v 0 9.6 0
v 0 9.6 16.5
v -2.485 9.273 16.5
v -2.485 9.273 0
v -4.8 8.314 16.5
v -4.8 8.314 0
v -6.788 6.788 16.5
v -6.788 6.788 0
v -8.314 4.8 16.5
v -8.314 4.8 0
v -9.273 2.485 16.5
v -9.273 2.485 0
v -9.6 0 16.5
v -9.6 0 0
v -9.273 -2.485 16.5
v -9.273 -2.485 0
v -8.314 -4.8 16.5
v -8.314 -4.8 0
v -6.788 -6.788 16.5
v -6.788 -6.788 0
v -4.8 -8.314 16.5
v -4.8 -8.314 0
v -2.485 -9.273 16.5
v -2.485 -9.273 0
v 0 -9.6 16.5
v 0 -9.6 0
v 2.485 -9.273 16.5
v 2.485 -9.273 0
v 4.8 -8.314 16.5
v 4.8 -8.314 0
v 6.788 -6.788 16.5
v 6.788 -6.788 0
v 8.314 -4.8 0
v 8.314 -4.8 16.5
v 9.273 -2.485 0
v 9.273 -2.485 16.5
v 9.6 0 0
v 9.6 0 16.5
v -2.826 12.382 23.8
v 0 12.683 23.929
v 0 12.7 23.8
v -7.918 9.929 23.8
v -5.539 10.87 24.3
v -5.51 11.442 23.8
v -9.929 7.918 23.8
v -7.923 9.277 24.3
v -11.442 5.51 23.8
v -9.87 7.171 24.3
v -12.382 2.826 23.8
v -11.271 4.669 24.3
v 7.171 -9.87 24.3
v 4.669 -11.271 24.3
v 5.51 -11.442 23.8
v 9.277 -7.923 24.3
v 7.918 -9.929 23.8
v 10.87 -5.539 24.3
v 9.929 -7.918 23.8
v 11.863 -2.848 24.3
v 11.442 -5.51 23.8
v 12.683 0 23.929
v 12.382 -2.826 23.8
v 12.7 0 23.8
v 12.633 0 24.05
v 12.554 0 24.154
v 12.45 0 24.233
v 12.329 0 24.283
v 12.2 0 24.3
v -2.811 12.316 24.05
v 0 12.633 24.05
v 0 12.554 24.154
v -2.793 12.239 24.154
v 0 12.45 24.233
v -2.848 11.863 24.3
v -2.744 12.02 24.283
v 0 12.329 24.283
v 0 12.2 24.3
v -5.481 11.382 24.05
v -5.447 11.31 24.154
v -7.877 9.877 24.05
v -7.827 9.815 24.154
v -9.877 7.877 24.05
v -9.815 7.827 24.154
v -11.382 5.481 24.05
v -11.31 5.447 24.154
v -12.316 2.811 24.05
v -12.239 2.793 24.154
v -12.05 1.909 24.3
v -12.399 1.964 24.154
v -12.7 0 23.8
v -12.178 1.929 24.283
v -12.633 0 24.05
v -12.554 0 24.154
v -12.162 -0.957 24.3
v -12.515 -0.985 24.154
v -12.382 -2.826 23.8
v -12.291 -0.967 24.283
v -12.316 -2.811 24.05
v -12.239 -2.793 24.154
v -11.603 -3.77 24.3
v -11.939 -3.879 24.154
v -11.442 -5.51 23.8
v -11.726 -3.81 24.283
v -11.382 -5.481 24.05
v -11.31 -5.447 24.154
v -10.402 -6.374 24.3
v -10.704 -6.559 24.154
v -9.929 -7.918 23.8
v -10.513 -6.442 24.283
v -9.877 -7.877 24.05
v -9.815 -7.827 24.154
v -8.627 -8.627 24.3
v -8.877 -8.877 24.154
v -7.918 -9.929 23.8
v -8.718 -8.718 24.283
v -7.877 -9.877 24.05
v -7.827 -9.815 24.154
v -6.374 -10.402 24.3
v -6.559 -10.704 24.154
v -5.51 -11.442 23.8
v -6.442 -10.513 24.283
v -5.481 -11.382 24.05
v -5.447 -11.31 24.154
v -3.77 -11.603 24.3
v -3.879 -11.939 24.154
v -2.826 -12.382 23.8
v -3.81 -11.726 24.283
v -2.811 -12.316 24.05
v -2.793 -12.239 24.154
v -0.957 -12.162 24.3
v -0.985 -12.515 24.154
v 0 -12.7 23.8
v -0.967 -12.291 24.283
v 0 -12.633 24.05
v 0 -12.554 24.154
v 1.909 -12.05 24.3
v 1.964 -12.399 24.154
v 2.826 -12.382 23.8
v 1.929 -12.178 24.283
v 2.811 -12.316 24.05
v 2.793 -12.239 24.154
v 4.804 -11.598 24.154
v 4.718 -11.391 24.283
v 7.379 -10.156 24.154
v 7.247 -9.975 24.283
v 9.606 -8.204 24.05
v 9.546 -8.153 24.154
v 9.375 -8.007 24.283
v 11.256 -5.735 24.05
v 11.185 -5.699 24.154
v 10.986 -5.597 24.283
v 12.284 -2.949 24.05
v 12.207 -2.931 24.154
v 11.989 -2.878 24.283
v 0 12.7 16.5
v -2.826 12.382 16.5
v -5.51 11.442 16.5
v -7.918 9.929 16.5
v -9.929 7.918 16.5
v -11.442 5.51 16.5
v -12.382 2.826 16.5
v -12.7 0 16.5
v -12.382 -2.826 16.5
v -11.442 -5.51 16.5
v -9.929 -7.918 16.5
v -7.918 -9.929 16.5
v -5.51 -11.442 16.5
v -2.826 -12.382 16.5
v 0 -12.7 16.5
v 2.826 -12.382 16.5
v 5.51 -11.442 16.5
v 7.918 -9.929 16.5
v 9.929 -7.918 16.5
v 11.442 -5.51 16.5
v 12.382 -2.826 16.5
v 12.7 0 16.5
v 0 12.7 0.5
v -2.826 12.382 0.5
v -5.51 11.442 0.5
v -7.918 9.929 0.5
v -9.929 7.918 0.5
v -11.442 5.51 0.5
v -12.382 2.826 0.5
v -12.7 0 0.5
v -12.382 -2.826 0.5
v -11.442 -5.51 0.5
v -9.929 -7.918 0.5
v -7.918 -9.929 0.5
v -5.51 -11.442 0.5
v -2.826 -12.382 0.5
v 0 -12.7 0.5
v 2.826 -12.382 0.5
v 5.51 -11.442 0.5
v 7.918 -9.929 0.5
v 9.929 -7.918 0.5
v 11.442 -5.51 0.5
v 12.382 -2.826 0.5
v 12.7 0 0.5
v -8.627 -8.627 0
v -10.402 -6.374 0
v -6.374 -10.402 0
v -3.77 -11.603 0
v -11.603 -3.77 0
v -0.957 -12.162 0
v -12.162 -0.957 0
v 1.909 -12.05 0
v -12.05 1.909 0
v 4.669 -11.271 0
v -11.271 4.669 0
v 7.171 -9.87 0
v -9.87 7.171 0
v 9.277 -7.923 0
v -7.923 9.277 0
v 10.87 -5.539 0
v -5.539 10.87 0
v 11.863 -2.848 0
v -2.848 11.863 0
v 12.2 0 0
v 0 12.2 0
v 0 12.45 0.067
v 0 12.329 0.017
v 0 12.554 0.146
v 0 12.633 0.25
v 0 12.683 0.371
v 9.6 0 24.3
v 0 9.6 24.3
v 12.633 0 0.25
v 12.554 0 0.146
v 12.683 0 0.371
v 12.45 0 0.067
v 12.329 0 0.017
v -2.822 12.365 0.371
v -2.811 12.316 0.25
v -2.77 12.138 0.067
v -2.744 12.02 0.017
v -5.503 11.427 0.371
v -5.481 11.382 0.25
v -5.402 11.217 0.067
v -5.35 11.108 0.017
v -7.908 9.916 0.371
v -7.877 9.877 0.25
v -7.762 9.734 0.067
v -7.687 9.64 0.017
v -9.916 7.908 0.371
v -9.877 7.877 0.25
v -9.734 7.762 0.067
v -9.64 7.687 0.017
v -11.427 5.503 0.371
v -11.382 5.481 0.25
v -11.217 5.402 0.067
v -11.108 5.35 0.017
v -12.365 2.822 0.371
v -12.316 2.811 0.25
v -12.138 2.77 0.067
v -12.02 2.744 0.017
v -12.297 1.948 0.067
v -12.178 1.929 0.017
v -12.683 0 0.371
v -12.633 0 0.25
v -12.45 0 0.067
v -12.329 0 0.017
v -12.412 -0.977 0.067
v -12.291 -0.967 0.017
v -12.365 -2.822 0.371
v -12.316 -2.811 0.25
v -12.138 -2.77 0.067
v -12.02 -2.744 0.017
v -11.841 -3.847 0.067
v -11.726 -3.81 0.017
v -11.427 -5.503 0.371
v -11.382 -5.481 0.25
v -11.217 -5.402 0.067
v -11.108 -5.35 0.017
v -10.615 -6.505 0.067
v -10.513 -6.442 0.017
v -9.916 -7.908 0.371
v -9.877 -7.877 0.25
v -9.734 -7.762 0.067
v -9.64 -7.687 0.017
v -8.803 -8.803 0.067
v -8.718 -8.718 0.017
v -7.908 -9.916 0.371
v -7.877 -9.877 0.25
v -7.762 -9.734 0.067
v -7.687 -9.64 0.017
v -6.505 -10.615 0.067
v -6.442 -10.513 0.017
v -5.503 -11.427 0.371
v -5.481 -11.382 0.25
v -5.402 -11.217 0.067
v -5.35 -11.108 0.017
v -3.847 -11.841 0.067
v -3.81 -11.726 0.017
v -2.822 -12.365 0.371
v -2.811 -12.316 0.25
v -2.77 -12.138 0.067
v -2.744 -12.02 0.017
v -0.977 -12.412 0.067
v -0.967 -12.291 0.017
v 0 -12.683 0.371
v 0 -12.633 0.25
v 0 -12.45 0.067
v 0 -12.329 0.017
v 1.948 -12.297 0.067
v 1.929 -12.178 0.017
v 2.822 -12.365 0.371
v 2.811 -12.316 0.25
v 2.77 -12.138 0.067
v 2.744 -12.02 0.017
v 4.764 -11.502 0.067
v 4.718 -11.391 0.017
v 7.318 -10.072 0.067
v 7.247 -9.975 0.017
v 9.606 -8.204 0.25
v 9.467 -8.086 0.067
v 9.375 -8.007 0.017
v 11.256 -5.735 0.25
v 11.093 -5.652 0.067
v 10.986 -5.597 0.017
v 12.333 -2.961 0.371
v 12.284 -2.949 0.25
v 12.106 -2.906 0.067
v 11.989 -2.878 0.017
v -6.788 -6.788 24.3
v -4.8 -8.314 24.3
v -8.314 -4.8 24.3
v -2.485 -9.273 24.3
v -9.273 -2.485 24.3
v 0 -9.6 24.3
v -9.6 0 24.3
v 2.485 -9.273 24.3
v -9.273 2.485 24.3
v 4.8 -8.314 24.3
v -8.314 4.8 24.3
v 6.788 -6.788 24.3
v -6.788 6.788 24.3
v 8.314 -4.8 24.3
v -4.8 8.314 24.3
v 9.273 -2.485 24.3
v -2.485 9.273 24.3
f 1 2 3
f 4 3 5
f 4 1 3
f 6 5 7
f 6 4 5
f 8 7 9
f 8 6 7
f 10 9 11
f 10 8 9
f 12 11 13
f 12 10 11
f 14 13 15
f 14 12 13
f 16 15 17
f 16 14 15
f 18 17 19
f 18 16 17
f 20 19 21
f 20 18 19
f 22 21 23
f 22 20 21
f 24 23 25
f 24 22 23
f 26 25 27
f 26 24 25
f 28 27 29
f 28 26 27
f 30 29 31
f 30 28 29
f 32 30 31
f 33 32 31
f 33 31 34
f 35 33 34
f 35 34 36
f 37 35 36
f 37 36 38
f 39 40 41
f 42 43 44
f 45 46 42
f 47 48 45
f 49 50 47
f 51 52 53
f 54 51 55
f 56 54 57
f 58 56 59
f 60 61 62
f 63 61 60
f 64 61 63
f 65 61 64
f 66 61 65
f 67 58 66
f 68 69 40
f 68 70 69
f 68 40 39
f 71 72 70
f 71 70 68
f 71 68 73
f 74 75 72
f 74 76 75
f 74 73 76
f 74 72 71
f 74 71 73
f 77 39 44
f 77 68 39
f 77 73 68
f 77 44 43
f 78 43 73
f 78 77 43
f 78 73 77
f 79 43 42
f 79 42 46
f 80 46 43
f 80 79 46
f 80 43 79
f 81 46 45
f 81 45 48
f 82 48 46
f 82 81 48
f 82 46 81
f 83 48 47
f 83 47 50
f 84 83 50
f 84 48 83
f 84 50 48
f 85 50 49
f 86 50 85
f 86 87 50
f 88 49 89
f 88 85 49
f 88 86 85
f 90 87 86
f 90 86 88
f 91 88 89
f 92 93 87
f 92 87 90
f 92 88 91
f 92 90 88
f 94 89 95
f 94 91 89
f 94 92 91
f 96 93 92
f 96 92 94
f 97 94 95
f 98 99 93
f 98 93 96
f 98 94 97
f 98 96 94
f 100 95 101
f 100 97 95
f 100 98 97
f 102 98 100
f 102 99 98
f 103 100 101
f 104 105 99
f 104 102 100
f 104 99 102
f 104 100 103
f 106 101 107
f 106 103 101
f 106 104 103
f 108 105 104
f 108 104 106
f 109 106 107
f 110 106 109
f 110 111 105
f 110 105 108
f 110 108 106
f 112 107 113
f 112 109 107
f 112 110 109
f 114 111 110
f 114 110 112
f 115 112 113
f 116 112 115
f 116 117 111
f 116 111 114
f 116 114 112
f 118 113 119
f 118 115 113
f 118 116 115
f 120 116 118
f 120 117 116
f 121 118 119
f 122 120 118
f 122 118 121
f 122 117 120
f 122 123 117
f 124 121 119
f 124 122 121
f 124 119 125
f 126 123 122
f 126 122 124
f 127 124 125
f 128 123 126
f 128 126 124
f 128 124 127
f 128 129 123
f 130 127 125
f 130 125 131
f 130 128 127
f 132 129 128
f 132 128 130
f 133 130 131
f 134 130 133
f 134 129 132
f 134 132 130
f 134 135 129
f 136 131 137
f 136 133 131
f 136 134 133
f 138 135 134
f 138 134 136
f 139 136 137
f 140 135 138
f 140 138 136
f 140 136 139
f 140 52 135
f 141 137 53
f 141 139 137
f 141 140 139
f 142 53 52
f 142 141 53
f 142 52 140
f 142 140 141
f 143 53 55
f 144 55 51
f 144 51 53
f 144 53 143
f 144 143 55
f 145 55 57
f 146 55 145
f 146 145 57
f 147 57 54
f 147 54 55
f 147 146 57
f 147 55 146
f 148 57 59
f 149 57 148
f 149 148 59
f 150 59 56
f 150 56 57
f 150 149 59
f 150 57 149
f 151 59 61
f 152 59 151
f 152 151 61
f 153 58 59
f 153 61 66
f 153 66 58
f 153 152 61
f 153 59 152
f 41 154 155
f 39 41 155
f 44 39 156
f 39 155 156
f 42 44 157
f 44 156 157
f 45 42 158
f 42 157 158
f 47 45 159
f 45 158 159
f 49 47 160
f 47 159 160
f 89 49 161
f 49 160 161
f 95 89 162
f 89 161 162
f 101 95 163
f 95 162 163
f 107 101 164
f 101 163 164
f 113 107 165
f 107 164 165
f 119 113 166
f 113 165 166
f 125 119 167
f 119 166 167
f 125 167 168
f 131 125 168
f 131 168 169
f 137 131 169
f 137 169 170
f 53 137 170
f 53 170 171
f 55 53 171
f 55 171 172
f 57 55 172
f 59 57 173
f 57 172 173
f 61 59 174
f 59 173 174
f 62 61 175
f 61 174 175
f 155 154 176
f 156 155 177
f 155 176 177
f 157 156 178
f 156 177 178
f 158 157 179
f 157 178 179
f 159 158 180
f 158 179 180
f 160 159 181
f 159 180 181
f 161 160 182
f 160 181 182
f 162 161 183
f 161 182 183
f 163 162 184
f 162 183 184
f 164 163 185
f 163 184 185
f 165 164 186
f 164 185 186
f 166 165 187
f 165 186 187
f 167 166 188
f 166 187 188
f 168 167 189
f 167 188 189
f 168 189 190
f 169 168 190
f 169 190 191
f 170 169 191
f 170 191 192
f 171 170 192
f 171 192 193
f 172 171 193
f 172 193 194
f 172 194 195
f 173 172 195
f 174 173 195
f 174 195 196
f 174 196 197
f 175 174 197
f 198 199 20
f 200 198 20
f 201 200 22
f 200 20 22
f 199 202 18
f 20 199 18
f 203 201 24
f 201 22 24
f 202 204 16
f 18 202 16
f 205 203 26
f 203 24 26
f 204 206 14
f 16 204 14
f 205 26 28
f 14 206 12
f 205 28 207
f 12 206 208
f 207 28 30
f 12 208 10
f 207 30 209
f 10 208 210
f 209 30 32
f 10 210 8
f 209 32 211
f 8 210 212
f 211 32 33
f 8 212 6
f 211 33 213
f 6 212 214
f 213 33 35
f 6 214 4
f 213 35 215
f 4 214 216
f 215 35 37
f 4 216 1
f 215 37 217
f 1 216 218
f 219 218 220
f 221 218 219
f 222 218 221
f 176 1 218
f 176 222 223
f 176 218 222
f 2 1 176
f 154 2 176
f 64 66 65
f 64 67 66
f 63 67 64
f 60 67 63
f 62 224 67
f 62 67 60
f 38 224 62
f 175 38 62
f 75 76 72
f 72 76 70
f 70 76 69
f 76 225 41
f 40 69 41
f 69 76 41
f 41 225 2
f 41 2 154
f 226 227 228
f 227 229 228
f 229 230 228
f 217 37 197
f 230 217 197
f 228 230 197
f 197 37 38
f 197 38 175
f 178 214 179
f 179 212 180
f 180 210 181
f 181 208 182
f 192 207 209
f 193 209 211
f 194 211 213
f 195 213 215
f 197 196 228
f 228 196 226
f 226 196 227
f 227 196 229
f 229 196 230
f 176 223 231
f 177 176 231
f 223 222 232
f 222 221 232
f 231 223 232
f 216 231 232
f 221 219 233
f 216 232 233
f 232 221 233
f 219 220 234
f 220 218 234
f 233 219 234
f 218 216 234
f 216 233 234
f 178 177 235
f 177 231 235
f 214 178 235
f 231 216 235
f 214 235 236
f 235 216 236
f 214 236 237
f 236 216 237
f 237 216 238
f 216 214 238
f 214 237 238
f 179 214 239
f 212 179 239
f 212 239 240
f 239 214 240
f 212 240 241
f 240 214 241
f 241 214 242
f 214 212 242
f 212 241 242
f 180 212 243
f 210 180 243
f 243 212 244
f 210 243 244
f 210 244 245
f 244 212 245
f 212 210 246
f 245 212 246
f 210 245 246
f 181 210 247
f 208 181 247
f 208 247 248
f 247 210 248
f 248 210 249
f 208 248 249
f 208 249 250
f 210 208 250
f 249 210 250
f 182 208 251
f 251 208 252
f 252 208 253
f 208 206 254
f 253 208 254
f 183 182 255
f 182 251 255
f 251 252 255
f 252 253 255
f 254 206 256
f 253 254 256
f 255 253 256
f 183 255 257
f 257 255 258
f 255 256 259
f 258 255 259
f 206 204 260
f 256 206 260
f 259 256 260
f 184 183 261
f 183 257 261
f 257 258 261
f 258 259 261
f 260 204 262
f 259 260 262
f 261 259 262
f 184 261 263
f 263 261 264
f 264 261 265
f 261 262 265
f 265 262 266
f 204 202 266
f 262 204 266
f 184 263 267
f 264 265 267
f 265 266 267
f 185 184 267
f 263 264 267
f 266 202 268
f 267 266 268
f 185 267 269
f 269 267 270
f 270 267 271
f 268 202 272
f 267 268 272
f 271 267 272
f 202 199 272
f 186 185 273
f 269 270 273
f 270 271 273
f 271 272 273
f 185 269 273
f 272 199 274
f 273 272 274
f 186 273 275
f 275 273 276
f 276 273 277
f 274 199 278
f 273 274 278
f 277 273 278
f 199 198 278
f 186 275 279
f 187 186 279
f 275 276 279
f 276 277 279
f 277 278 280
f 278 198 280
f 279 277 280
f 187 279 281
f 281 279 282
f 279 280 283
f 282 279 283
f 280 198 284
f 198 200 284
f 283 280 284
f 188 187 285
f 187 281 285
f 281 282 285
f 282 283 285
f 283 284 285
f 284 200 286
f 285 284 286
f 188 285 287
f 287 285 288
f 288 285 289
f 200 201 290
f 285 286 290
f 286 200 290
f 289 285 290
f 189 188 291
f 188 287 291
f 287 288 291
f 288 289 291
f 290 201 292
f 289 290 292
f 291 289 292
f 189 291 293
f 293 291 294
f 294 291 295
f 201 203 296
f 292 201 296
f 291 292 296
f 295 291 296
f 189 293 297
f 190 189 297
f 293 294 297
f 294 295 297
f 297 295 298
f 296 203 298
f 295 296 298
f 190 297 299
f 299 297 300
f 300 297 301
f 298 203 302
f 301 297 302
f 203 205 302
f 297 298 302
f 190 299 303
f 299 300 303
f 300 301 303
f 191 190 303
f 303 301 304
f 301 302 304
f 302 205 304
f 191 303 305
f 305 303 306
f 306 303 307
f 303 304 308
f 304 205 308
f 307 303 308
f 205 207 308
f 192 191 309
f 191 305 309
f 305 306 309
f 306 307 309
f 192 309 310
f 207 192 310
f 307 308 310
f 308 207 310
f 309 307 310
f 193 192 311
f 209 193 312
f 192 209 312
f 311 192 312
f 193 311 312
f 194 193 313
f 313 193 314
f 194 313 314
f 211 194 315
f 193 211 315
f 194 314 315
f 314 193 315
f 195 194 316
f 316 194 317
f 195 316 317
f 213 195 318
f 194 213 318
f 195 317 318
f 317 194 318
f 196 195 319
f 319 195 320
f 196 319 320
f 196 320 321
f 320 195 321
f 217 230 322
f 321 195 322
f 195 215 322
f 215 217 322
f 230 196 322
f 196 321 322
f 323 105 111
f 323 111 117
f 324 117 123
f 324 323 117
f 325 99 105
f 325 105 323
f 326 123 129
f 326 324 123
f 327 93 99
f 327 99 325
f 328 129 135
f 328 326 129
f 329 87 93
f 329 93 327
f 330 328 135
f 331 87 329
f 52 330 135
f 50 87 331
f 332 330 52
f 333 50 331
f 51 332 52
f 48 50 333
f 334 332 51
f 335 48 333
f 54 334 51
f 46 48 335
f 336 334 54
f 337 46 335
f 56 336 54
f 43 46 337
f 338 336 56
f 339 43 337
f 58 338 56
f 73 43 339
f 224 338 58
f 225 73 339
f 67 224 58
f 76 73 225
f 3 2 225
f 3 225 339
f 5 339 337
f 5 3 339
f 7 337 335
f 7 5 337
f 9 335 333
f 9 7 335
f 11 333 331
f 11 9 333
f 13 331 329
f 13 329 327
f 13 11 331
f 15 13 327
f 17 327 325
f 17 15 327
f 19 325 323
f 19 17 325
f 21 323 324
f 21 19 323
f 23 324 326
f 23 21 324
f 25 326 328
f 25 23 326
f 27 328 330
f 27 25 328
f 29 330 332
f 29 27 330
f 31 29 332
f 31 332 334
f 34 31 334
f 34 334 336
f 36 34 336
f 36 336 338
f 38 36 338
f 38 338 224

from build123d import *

# Parameters (mm, degrees)
F0_R     = 12.7
F0_R_2   = 9.6
F1_DEPTH = 16.5
F2_W     = 14.3193947151
F2_H     = 14.0517447144
F3_DEPTH = 16.501
F4_DEPTH = 7.8
F5_R     = 0.5


with BuildPart() as f1:
    # F0 (on Top) → F1 (new body)
    with BuildSketch(Plane.XY):
        Circle(F0_R)
        Circle(F0_R_2, mode=Mode.SUBTRACT)
    extrude(amount=F1_DEPTH)

    # F2 (on face) → F3 (cut, through all)
    with BuildSketch(Plane.XY.offset(16.5)):
        with Locations((7.1596973576, 7.0258723572)):
            Rectangle(F2_W, F2_H)
    extrude(amount=-F3_DEPTH, mode=Mode.SUBTRACT)

    # F4 (add): a face of the model
    f4_faces = [f1.faces().sort_by_distance(p)[0] for p in [
        (-8.7262561211, -8.7262561211, 16.5),
    ]]
    extrude(f4_faces, amount=F4_DEPTH)

    # F5
    f5_edges = [f1.edges().sort_by_distance(p)[0] for p in [
        (-8.980256, -8.980256, 24.3),
        (-8.980256, -8.980256, 0),
    ]]
    fillet(f5_edges, radius=F5_R)


solid = f1.part
